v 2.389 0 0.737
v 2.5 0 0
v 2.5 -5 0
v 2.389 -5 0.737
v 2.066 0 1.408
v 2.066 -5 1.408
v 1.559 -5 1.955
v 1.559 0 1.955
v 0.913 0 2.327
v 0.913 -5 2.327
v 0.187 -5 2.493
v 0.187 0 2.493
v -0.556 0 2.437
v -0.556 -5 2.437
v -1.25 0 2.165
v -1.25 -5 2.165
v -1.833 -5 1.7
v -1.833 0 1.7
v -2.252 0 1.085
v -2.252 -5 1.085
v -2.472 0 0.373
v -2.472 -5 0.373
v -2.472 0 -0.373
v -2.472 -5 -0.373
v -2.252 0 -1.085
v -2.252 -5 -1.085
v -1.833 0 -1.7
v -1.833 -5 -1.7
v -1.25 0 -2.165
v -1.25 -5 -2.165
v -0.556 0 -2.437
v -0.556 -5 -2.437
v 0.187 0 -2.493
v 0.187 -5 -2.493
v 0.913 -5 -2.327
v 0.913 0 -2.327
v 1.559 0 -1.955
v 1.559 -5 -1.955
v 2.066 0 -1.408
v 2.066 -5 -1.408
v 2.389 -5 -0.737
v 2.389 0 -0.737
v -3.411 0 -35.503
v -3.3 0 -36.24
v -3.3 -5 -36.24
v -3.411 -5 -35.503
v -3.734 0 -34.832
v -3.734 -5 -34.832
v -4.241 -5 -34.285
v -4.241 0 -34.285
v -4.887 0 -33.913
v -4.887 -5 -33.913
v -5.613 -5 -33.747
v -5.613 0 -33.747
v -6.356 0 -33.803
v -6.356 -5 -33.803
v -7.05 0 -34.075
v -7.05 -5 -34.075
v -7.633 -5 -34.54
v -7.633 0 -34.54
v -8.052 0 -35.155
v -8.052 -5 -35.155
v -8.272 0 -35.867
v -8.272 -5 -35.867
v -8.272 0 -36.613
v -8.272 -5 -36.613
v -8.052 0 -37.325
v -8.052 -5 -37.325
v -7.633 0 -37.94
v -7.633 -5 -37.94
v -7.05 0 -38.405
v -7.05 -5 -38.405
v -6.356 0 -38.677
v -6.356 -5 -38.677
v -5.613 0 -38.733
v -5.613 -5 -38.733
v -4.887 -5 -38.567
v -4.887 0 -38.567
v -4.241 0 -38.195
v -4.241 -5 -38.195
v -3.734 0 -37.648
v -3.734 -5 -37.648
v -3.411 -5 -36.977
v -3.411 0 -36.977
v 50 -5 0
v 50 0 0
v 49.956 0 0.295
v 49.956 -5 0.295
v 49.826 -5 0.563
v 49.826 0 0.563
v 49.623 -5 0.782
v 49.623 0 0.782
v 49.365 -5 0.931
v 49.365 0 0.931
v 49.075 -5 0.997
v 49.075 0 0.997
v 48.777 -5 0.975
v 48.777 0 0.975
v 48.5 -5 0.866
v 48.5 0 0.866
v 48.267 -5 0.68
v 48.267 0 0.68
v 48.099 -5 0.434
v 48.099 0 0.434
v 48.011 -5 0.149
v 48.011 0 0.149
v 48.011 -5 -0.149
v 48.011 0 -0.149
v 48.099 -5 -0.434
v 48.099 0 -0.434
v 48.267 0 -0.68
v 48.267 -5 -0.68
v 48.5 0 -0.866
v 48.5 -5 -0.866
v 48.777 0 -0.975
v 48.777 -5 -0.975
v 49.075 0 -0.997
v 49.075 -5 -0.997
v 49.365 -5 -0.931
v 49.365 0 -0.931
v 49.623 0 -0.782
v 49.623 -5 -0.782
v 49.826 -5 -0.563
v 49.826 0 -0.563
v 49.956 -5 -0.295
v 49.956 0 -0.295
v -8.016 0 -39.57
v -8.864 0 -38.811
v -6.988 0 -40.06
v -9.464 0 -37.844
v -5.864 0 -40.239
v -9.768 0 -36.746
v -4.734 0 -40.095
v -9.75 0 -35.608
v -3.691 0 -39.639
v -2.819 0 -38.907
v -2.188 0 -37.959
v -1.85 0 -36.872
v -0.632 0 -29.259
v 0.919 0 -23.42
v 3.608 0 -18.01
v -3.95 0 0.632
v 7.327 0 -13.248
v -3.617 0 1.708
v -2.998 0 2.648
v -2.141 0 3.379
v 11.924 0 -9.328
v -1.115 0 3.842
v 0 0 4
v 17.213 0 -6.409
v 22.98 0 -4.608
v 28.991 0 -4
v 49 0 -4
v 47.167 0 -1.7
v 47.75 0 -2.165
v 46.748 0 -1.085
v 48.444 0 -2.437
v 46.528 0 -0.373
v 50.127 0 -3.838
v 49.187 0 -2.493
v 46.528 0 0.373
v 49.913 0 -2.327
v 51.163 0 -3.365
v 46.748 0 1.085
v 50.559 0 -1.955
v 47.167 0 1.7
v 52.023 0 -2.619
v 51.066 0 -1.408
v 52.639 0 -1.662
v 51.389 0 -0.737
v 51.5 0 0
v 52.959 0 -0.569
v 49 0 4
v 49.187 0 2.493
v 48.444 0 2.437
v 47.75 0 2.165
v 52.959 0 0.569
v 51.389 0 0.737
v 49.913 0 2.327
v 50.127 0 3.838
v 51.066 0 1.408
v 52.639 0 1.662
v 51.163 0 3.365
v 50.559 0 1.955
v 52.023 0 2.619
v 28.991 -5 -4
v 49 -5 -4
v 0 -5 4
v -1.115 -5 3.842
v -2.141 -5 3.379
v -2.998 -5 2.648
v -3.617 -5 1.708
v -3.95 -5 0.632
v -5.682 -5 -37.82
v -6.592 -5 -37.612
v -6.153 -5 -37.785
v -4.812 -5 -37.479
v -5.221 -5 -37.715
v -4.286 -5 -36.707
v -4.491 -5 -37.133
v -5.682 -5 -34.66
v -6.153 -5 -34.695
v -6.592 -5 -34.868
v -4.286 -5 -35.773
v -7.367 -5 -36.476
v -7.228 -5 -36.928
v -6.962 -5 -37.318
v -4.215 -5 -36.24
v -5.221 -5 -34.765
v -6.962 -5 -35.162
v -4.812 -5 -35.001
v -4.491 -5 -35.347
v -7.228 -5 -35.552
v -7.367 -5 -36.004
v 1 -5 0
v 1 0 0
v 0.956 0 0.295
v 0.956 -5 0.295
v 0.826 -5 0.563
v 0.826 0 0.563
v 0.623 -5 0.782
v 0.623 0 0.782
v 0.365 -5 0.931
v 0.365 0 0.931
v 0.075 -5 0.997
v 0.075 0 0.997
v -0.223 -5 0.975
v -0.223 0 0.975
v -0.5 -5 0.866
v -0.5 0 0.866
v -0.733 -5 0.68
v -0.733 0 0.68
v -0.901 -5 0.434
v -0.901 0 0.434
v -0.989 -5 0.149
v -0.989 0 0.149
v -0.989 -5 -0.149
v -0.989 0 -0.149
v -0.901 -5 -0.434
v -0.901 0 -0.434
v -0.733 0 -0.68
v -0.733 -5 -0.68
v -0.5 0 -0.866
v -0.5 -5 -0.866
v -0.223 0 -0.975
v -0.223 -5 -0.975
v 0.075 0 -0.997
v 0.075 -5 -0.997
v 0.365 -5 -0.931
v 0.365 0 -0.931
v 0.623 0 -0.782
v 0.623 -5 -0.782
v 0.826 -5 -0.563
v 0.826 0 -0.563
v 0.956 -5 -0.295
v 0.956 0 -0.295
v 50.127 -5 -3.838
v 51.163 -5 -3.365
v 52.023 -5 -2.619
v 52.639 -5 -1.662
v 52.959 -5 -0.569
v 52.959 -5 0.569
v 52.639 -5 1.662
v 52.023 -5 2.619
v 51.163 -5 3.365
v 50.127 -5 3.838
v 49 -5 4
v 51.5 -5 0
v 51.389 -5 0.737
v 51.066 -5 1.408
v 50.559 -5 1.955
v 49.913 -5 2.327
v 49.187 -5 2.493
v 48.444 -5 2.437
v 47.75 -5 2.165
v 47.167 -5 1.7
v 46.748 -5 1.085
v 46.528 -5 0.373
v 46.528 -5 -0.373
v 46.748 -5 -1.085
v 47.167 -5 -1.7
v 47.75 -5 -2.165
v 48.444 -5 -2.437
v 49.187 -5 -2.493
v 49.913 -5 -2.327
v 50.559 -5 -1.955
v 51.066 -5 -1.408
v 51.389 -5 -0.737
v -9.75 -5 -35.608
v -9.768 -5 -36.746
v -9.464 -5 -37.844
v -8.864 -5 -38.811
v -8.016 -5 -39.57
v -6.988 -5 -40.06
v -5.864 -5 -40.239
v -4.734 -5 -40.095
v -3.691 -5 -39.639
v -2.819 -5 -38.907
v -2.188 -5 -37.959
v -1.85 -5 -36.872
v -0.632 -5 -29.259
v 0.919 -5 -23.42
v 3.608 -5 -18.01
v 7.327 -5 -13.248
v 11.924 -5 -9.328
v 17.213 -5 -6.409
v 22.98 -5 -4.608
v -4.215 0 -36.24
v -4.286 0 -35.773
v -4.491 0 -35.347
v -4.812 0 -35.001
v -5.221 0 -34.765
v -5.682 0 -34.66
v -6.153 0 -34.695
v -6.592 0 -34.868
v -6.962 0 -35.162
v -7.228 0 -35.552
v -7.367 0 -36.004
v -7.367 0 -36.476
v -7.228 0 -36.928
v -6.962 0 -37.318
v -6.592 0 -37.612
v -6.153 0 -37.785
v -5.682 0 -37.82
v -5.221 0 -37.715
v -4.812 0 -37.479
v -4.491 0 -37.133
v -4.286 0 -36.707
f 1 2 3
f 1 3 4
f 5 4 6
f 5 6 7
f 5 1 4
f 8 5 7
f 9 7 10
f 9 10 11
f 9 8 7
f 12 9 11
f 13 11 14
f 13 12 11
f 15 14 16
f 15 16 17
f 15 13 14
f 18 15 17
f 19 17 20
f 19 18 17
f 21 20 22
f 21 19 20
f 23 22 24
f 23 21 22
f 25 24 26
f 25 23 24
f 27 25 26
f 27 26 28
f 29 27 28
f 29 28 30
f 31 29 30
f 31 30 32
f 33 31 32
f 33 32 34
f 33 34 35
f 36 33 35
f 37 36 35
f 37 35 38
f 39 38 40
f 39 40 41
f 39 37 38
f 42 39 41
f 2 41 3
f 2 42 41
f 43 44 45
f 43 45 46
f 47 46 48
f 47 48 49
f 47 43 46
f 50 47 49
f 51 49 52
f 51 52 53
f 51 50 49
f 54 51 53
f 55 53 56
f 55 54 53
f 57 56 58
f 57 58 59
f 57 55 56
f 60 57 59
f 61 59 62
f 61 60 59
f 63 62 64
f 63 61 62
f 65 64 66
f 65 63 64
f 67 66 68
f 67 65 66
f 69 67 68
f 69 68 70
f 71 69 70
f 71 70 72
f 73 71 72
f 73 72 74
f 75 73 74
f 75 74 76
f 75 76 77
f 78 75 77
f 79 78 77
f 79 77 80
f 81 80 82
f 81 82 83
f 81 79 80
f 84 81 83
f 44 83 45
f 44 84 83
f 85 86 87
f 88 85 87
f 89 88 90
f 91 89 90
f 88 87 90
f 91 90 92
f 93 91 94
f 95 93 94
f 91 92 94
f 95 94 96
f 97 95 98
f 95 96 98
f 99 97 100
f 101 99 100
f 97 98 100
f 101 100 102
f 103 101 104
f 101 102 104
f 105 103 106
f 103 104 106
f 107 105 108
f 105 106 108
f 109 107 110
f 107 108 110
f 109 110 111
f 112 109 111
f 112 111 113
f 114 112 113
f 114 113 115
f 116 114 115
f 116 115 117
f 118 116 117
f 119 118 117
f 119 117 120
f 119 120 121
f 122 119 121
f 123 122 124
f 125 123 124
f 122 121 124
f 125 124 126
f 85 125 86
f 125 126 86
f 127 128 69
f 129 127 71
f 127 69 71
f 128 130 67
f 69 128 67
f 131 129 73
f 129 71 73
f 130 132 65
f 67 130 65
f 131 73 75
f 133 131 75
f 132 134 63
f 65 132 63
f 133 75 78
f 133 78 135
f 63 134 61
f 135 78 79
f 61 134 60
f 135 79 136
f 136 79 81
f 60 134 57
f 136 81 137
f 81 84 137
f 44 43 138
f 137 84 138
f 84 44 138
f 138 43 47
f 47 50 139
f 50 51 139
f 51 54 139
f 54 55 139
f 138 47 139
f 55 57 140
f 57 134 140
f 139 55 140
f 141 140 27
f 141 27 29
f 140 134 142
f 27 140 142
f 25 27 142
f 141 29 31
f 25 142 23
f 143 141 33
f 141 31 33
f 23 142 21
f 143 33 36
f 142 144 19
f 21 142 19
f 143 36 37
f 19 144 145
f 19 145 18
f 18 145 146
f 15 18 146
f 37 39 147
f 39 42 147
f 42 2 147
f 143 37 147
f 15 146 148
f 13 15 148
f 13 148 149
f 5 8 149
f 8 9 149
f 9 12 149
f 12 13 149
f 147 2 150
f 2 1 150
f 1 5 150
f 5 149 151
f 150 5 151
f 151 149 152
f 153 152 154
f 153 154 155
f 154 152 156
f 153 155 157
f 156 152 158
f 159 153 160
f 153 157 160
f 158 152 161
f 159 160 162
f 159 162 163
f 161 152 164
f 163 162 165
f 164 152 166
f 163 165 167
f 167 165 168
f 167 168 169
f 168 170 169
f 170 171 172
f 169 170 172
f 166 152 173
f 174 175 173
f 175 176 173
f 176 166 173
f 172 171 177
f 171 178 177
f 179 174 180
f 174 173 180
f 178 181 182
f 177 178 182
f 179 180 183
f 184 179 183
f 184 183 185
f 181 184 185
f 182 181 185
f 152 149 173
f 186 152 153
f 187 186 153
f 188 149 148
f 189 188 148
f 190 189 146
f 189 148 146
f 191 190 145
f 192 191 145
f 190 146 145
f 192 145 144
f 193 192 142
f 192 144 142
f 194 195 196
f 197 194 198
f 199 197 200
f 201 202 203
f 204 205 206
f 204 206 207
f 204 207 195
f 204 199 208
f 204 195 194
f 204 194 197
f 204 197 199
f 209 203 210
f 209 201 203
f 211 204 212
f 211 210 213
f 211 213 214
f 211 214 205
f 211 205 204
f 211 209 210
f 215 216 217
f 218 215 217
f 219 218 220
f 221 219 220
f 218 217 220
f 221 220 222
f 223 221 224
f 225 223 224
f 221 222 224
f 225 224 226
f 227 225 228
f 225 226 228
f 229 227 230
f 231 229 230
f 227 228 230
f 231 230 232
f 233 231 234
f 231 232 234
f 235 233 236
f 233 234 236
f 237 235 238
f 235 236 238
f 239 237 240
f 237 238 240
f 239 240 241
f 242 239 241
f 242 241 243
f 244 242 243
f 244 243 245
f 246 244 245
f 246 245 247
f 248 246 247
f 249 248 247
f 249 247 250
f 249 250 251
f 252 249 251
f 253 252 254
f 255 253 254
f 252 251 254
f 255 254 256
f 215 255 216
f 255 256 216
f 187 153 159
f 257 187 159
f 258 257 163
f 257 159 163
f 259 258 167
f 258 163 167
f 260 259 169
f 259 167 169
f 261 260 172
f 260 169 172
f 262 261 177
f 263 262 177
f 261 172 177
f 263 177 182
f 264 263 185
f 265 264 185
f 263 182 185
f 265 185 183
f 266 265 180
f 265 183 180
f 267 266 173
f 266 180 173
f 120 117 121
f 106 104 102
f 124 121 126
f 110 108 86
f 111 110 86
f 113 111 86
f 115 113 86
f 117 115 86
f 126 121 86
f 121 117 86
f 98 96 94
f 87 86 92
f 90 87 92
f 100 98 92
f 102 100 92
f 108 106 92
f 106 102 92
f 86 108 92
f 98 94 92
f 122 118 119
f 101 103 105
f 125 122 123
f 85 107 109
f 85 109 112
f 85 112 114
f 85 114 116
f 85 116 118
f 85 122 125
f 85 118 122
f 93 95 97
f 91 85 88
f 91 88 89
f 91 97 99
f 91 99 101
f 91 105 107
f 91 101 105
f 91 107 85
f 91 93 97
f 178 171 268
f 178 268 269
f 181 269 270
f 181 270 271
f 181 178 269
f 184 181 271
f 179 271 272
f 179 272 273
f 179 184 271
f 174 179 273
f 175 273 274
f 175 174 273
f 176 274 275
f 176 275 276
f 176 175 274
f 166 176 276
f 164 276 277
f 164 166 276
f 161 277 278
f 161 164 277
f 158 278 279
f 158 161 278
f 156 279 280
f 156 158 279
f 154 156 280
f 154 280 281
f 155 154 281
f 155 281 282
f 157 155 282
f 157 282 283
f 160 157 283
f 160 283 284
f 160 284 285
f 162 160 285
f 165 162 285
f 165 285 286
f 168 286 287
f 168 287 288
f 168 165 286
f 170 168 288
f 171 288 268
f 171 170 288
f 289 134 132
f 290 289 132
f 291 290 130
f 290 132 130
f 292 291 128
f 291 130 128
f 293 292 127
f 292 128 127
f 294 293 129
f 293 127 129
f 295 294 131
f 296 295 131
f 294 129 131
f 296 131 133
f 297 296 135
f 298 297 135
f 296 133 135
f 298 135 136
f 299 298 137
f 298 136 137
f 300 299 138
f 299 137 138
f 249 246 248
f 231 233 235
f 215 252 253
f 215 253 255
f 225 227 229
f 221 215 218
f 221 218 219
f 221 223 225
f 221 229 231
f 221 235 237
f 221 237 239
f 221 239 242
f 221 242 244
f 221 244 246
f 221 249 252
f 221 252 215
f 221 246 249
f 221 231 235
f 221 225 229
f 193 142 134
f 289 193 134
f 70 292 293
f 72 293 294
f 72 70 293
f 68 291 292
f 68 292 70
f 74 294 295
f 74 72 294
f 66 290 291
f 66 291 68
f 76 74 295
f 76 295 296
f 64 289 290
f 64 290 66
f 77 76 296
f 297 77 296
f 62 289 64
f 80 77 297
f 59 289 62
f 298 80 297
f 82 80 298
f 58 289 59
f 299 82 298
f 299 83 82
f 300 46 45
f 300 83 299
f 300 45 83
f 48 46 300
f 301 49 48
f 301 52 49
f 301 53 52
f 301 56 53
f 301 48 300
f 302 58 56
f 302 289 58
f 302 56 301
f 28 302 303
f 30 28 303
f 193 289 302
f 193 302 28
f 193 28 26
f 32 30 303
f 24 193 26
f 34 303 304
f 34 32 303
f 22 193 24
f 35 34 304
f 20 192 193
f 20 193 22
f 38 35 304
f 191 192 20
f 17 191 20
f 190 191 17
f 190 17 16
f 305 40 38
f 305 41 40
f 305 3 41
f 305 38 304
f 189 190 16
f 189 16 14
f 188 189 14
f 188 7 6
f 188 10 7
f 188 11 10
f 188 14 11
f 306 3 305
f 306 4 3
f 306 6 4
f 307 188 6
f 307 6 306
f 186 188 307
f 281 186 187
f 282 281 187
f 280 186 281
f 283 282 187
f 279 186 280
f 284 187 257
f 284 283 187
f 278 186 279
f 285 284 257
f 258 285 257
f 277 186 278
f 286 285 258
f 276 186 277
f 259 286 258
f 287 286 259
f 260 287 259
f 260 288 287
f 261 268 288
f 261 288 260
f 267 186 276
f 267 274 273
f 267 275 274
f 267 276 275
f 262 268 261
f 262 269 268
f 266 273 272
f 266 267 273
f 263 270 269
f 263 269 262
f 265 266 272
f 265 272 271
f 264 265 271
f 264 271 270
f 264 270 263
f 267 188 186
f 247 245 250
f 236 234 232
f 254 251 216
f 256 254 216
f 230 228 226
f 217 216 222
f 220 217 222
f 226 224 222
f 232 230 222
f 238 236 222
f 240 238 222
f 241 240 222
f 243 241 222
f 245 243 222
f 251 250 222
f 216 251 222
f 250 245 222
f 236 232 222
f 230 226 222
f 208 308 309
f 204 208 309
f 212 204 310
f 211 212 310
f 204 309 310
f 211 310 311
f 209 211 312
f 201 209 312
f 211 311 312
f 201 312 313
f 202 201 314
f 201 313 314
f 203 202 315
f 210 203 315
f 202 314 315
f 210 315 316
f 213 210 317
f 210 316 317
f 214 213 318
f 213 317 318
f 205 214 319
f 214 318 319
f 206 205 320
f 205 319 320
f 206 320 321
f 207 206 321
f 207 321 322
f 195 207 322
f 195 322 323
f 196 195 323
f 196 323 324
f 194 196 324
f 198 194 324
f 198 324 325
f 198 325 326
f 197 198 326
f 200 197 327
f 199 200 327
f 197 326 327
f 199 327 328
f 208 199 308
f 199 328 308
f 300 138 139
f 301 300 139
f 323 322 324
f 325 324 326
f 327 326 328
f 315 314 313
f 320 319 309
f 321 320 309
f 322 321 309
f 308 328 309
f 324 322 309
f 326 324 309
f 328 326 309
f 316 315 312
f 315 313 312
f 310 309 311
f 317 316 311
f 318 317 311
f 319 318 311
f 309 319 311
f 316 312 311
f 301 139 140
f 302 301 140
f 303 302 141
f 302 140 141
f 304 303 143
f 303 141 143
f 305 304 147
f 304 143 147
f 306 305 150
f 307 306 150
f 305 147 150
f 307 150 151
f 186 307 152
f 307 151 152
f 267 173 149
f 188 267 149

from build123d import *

# Parameters (mm, degrees)
F0_R     = 2.5
F1_DEPTH = 5
F2_R     = 1
F2_R_2   = 1.584808
F3_DEPTH = 5


with BuildPart() as f1:
    # F0 (on Front) → F1 (new body)
    with BuildSketch(Plane.XZ):
        with BuildLine():
            Line((49, 4), (0, 4))
            ThreePointArc((0, 4), (-2.59533, 3.043725), (-3.949735, 0.632132))
            Line((-3.949735, 0.632132), (-9.749735, -35.607868))
            ThreePointArc((-9.749735, -35.607868), (-6.432132, -40.189735), (-1.850265, -36.872132))
            Line((-1.850265, -36.872132), (-0.631829, -29.25901))
            ThreePointArc((-0.631829, -29.25901), (9.526214, -11.17206), (28.991186, -4))
            Line((28.991186, -4), (49, -4))
            ThreePointArc((49, -4), (53, 0), (49, 4))
        make_face()
        with Locations((-5.8, -36.24)):
            Circle(F0_R, mode=Mode.SUBTRACT)
        Circle(F0_R, mode=Mode.SUBTRACT)
        with Locations((49, 0)):
            Circle(F0_R, mode=Mode.SUBTRACT)
    extrude(amount=F1_DEPTH)


with BuildPart() as f3:
    # F2 (on Front) → F3 (new body)
    with BuildSketch(Plane.XZ):
        Circle(F2_R)
        with Locations((-5.8, -36.24)):
            Circle(F2_R_2)
        with Locations((49, 0)):
            Circle(F2_R)
    extrude(amount=F3_DEPTH)


solid = Compound([f1.part, f3.part])
